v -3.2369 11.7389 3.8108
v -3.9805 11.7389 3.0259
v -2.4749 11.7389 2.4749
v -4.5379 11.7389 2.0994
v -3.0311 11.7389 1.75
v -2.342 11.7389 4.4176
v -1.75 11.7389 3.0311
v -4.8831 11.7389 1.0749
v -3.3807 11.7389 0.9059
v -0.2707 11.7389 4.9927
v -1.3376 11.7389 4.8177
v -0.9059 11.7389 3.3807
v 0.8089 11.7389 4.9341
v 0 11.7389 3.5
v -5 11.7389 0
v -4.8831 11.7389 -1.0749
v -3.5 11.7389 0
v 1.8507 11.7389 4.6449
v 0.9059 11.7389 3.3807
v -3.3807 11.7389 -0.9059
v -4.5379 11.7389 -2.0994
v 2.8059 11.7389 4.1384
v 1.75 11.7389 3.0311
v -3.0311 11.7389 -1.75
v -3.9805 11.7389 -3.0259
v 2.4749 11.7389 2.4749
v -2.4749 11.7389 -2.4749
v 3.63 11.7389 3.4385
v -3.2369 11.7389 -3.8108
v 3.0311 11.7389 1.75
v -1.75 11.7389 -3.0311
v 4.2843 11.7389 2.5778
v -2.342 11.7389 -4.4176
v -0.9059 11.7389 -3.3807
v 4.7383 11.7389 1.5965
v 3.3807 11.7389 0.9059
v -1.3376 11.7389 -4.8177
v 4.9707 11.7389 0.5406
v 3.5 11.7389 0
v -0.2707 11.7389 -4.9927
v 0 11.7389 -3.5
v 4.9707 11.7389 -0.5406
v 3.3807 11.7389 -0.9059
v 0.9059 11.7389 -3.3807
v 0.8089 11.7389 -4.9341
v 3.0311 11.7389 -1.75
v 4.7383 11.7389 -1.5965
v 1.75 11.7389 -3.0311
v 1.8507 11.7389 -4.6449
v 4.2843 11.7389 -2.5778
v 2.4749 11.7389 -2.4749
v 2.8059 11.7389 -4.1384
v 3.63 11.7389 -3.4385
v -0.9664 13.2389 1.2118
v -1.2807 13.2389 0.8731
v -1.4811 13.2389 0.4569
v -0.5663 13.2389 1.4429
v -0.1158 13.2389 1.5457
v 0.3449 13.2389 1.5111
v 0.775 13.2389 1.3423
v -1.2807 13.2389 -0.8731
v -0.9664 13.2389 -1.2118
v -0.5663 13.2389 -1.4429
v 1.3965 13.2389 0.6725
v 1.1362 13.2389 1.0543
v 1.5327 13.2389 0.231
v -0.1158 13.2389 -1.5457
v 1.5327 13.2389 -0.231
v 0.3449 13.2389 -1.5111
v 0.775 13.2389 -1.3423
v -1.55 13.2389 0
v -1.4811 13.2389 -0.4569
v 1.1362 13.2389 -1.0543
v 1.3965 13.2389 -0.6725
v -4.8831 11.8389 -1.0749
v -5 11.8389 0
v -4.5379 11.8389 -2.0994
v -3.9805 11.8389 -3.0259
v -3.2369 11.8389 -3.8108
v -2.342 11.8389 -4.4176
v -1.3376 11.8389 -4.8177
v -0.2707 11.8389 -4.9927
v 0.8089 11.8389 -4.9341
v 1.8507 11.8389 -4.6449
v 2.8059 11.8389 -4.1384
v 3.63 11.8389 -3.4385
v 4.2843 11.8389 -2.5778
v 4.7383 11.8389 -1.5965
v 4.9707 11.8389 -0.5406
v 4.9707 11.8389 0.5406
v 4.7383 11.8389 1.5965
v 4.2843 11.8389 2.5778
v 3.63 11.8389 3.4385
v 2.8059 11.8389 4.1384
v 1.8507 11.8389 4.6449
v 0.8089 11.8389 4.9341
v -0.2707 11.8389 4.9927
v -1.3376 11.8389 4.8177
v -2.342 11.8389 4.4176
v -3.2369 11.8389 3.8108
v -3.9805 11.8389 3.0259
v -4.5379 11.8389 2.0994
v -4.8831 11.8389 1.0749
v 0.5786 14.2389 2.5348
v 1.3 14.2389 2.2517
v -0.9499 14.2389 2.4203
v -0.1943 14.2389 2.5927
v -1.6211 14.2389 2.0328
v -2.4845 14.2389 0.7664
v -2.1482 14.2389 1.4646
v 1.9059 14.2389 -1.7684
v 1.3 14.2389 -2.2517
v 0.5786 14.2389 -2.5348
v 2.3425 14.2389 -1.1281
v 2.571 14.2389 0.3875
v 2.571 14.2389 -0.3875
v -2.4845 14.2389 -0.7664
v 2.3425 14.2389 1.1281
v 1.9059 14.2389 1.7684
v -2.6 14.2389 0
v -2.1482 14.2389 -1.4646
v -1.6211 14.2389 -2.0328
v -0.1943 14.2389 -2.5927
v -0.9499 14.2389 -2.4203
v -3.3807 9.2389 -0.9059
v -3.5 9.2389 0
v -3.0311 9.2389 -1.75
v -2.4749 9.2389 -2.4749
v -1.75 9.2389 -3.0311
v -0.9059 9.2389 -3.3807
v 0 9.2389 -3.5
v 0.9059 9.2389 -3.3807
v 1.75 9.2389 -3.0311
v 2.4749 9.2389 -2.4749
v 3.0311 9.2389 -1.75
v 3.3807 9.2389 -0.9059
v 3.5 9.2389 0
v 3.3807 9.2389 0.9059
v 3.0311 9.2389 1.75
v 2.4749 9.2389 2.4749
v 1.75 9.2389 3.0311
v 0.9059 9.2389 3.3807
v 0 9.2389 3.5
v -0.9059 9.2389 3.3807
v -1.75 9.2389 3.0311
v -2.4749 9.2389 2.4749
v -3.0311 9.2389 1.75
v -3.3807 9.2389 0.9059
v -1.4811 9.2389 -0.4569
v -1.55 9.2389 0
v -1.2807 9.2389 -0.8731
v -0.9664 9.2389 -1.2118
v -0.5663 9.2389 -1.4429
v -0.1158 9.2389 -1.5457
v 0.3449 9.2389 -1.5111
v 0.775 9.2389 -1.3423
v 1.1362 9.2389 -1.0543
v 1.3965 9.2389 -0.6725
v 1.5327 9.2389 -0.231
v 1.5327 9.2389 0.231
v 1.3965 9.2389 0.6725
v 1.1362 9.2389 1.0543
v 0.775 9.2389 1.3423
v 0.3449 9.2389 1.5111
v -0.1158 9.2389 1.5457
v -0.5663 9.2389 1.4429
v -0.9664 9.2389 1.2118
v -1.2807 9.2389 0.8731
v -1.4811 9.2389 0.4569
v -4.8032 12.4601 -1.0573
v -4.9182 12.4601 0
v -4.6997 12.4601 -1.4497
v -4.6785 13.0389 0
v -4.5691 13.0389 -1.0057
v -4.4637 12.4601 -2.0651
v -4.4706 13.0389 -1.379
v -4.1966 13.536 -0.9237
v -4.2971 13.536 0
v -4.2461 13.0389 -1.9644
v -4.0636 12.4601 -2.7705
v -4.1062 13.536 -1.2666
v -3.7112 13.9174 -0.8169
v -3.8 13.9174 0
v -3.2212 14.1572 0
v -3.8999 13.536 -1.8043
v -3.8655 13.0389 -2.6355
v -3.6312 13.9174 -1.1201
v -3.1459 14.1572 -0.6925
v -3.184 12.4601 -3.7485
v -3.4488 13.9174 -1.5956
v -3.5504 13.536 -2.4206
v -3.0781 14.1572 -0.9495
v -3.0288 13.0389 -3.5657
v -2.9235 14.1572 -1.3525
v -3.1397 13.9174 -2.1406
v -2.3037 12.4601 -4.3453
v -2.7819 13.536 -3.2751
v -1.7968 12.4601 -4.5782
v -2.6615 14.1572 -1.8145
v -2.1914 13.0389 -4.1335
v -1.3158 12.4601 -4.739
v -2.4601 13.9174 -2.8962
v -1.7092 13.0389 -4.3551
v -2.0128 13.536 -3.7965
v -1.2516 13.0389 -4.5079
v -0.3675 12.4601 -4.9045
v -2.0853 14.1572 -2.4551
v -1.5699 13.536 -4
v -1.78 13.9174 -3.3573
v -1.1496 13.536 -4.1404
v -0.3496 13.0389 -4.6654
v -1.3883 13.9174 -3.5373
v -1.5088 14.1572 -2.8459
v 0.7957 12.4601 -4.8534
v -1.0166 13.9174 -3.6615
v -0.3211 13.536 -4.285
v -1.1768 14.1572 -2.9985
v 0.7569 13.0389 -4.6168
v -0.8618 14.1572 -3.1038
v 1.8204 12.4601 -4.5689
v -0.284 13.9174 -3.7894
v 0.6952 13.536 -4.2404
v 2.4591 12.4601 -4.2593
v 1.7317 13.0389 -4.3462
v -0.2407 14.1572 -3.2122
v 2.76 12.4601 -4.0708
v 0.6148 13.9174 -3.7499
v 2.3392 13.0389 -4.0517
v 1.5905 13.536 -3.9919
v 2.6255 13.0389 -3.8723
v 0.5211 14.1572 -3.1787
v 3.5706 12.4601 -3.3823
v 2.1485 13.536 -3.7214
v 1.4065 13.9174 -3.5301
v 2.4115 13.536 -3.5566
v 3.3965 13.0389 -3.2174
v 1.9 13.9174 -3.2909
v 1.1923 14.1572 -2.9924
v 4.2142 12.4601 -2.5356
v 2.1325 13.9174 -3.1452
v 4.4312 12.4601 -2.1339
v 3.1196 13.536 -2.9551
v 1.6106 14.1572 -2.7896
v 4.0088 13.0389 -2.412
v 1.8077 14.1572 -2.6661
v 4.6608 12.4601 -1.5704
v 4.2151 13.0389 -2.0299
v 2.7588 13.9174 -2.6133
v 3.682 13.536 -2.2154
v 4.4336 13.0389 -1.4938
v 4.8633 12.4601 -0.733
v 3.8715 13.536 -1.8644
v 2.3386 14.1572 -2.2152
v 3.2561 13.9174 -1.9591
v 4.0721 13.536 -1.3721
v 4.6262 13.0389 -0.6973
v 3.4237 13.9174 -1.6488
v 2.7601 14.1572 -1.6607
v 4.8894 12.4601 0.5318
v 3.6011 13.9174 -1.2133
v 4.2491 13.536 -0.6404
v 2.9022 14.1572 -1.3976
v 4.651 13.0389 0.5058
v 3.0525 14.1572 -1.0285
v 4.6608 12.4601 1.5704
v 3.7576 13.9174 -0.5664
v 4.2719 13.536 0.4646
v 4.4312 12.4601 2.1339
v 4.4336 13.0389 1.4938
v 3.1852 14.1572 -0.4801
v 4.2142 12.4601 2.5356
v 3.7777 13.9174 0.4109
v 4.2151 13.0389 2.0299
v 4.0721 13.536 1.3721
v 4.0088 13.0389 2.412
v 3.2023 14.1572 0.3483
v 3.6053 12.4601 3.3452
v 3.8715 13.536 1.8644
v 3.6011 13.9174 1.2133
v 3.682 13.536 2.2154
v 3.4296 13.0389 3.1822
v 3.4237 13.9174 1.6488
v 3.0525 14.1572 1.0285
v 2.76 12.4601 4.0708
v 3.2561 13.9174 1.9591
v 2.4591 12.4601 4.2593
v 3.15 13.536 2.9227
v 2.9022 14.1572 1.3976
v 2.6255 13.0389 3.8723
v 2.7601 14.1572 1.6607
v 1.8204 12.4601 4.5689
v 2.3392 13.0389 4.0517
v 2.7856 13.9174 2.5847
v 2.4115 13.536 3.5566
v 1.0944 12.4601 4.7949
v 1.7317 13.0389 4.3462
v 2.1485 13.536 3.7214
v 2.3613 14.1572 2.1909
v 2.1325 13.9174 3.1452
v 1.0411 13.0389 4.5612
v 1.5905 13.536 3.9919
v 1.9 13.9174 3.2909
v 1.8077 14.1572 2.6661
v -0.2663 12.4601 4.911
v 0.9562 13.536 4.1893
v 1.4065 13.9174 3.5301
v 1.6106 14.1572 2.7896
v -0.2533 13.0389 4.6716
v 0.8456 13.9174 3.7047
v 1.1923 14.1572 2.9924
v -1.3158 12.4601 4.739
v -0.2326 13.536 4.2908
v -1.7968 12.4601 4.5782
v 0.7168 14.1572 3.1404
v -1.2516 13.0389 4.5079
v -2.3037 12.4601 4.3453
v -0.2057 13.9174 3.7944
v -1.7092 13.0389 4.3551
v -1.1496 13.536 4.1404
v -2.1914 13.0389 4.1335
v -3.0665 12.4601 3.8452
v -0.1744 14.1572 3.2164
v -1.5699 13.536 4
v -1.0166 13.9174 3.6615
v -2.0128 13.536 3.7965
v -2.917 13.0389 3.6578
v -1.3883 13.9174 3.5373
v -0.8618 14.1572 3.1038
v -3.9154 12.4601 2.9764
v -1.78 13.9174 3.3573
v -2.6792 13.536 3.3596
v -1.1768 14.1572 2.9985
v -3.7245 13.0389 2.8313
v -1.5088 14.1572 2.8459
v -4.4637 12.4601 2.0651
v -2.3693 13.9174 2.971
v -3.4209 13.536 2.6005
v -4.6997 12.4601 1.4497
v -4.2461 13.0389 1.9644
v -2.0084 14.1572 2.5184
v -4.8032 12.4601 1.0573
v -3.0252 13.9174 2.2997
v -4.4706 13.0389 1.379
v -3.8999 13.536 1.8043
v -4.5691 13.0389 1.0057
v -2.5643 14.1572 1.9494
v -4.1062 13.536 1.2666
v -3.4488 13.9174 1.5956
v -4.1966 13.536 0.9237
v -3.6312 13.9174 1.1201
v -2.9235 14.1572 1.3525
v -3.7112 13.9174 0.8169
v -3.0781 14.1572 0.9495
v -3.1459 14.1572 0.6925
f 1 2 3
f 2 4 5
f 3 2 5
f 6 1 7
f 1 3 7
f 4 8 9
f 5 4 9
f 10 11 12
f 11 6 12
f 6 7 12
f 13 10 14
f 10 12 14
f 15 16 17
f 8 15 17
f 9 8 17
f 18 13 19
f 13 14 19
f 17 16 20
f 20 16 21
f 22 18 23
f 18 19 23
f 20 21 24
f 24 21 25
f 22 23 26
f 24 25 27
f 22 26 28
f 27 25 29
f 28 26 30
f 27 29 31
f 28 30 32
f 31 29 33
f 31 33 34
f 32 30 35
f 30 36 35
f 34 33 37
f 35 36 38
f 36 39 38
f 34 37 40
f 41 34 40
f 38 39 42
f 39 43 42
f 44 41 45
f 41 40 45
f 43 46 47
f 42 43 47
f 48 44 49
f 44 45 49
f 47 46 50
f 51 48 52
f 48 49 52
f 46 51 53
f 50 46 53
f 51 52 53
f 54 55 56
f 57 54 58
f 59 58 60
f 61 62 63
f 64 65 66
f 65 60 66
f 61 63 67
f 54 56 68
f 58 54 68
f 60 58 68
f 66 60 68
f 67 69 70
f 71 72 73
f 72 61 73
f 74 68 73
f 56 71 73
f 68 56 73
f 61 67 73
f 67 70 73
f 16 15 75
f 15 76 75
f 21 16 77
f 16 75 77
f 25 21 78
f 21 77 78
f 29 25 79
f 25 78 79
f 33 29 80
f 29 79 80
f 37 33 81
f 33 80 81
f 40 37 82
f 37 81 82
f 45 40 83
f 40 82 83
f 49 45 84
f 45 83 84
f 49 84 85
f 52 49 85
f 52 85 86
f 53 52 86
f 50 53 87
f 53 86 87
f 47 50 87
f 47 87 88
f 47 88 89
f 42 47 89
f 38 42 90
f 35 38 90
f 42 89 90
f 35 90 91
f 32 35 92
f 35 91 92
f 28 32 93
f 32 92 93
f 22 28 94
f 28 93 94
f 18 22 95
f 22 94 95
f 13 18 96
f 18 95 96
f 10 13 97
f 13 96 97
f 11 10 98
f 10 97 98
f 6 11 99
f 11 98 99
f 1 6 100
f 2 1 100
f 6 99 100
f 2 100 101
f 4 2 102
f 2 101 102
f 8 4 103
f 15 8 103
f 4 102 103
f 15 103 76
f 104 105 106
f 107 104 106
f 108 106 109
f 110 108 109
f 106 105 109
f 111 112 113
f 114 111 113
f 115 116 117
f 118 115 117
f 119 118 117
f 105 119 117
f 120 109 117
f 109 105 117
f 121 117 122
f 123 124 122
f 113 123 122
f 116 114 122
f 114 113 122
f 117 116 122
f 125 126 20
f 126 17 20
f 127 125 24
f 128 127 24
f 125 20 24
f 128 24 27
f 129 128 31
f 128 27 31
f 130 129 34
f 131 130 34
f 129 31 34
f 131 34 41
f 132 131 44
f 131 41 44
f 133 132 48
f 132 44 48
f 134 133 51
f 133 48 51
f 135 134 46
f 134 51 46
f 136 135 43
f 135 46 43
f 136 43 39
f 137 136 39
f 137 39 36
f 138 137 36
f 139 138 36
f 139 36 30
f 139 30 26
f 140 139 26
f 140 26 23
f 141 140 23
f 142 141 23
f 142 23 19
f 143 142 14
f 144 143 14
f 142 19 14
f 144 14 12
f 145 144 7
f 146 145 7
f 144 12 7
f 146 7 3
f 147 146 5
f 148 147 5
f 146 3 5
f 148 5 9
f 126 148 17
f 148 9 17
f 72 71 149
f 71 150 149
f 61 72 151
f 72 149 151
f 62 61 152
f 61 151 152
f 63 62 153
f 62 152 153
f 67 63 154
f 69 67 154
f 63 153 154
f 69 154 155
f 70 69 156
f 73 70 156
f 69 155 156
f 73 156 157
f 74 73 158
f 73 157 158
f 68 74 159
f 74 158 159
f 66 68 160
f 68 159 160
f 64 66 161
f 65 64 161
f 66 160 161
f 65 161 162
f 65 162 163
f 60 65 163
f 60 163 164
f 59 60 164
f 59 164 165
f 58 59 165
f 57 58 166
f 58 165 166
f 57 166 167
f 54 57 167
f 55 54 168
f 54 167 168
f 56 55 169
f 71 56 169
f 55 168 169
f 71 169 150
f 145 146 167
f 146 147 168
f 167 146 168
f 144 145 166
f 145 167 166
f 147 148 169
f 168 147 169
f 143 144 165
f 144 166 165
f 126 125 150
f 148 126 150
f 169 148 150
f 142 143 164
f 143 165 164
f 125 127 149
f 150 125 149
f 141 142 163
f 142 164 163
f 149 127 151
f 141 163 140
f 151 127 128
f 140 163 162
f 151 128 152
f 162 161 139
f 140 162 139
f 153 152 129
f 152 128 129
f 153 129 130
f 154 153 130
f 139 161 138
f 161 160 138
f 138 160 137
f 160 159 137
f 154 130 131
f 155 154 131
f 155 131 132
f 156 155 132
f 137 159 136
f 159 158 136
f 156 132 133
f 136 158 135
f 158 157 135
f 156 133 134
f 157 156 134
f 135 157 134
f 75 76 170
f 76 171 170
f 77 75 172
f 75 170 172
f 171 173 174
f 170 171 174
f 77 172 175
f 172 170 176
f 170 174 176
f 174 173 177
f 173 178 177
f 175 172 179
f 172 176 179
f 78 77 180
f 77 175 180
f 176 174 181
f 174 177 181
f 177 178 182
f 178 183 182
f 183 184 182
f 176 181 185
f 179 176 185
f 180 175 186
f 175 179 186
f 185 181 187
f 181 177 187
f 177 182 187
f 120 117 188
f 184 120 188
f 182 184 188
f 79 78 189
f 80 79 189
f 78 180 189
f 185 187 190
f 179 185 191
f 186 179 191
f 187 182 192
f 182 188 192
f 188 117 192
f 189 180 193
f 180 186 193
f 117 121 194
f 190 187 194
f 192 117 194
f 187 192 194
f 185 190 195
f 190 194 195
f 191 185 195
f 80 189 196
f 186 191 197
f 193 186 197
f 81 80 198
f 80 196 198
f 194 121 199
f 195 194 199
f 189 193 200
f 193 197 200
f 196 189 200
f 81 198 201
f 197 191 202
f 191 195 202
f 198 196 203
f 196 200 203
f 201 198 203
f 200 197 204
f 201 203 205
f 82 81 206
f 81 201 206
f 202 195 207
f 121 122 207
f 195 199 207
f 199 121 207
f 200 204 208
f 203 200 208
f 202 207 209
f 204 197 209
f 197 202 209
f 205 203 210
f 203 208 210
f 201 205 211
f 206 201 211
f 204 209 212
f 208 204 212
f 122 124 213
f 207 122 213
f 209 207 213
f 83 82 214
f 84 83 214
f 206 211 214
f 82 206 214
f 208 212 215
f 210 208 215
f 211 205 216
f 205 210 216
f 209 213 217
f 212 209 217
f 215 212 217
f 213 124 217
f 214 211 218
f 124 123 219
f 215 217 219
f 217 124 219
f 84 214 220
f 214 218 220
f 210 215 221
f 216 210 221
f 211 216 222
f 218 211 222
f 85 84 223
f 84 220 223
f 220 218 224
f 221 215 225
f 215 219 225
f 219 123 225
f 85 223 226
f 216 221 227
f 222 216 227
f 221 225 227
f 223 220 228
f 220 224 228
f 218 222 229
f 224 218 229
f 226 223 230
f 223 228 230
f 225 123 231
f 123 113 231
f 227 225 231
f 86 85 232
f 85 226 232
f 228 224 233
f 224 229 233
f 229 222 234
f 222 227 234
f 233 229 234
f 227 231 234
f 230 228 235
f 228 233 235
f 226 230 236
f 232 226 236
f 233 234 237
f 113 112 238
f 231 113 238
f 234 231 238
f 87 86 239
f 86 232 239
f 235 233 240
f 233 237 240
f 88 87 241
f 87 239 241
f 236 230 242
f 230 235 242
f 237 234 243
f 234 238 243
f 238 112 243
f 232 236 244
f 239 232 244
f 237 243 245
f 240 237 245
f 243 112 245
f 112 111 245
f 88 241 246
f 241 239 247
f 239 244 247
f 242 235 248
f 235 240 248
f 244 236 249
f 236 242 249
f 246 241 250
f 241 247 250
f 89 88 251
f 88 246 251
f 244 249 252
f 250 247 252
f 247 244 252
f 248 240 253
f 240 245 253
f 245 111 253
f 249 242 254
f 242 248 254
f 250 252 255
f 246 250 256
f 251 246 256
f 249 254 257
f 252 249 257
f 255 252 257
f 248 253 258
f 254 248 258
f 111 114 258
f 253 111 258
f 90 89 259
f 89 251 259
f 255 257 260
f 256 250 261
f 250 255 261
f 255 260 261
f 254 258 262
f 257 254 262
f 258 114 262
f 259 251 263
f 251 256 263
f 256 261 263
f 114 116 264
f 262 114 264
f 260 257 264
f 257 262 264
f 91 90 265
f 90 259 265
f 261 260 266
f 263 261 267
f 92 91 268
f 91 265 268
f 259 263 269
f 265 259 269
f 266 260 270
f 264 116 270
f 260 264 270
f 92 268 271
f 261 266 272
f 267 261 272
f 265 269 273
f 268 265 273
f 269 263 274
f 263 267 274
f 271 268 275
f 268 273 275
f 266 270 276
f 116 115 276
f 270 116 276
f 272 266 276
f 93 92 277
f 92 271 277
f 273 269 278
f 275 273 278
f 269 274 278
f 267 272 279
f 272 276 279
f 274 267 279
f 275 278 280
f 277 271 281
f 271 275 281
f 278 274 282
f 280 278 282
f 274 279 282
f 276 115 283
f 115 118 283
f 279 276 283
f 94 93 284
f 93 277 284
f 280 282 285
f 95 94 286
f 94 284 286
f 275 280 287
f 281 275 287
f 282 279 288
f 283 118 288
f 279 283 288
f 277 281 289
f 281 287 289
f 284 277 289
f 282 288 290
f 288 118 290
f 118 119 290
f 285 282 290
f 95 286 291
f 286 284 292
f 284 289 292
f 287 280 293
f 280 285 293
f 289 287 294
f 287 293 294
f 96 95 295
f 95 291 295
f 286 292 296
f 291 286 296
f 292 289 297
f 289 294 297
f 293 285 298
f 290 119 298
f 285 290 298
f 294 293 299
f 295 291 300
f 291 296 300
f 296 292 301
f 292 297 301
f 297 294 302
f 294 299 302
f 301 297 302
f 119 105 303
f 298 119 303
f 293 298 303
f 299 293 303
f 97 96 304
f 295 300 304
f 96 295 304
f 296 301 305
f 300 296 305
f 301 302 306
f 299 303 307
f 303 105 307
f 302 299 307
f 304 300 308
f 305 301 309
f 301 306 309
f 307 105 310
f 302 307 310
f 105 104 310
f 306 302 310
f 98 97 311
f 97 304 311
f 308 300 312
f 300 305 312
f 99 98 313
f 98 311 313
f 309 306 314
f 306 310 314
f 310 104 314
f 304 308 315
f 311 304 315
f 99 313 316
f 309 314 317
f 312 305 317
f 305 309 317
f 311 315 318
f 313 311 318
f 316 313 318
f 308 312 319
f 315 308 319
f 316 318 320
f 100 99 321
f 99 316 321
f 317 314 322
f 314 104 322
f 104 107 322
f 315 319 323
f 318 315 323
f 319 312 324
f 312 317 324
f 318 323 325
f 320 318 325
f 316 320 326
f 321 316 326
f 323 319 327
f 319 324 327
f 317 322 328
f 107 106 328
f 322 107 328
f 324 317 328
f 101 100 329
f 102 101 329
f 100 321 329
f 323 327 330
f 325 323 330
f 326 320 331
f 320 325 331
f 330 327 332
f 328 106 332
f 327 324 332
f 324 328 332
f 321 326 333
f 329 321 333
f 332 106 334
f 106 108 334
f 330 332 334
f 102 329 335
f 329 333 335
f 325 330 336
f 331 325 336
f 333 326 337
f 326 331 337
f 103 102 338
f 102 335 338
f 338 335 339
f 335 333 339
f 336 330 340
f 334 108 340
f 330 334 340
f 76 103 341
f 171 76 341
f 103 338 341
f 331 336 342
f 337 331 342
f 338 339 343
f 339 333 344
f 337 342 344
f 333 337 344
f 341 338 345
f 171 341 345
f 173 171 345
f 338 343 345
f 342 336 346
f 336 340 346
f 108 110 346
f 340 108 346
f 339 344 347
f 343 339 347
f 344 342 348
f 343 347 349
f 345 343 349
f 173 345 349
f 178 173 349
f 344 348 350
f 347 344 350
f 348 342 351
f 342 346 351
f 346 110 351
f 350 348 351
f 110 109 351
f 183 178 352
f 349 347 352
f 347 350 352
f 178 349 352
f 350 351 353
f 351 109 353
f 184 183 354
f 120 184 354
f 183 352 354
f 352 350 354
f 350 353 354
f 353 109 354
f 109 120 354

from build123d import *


with BuildPart() as part:
    # Esboço1 → Revolução1 (revolve)
    with BuildSketch(Plane.XY):
        with BuildLine():
            Line((-1.55, 9.238932358), (-3.5, 9.238932358))
            Line((-3.5, 9.238932358), (-3.5, 11.738932358))
            Line((-3.5, 11.738932358), (-5, 11.738932358))
            Line((-5, 11.738932358), (-5, 11.838932358))
            ThreePointArc((-5, 11.838932358), (-4.297056275, 13.535988633), (-2.6, 14.238932358))
            Line((-2.6, 14.238932358), (0, 14.238932358))
            Line((0, 14.238932358), (0, 13.238932358))
            Line((0, 13.238932358), (-1.55, 13.238932358))
            Line((-1.55, 13.238932358), (-1.55, 9.238932358))
        make_face()
    revolve(axis=Axis((0, 36.954647584, 0), (0, -1, 0)))


solid = part.part
